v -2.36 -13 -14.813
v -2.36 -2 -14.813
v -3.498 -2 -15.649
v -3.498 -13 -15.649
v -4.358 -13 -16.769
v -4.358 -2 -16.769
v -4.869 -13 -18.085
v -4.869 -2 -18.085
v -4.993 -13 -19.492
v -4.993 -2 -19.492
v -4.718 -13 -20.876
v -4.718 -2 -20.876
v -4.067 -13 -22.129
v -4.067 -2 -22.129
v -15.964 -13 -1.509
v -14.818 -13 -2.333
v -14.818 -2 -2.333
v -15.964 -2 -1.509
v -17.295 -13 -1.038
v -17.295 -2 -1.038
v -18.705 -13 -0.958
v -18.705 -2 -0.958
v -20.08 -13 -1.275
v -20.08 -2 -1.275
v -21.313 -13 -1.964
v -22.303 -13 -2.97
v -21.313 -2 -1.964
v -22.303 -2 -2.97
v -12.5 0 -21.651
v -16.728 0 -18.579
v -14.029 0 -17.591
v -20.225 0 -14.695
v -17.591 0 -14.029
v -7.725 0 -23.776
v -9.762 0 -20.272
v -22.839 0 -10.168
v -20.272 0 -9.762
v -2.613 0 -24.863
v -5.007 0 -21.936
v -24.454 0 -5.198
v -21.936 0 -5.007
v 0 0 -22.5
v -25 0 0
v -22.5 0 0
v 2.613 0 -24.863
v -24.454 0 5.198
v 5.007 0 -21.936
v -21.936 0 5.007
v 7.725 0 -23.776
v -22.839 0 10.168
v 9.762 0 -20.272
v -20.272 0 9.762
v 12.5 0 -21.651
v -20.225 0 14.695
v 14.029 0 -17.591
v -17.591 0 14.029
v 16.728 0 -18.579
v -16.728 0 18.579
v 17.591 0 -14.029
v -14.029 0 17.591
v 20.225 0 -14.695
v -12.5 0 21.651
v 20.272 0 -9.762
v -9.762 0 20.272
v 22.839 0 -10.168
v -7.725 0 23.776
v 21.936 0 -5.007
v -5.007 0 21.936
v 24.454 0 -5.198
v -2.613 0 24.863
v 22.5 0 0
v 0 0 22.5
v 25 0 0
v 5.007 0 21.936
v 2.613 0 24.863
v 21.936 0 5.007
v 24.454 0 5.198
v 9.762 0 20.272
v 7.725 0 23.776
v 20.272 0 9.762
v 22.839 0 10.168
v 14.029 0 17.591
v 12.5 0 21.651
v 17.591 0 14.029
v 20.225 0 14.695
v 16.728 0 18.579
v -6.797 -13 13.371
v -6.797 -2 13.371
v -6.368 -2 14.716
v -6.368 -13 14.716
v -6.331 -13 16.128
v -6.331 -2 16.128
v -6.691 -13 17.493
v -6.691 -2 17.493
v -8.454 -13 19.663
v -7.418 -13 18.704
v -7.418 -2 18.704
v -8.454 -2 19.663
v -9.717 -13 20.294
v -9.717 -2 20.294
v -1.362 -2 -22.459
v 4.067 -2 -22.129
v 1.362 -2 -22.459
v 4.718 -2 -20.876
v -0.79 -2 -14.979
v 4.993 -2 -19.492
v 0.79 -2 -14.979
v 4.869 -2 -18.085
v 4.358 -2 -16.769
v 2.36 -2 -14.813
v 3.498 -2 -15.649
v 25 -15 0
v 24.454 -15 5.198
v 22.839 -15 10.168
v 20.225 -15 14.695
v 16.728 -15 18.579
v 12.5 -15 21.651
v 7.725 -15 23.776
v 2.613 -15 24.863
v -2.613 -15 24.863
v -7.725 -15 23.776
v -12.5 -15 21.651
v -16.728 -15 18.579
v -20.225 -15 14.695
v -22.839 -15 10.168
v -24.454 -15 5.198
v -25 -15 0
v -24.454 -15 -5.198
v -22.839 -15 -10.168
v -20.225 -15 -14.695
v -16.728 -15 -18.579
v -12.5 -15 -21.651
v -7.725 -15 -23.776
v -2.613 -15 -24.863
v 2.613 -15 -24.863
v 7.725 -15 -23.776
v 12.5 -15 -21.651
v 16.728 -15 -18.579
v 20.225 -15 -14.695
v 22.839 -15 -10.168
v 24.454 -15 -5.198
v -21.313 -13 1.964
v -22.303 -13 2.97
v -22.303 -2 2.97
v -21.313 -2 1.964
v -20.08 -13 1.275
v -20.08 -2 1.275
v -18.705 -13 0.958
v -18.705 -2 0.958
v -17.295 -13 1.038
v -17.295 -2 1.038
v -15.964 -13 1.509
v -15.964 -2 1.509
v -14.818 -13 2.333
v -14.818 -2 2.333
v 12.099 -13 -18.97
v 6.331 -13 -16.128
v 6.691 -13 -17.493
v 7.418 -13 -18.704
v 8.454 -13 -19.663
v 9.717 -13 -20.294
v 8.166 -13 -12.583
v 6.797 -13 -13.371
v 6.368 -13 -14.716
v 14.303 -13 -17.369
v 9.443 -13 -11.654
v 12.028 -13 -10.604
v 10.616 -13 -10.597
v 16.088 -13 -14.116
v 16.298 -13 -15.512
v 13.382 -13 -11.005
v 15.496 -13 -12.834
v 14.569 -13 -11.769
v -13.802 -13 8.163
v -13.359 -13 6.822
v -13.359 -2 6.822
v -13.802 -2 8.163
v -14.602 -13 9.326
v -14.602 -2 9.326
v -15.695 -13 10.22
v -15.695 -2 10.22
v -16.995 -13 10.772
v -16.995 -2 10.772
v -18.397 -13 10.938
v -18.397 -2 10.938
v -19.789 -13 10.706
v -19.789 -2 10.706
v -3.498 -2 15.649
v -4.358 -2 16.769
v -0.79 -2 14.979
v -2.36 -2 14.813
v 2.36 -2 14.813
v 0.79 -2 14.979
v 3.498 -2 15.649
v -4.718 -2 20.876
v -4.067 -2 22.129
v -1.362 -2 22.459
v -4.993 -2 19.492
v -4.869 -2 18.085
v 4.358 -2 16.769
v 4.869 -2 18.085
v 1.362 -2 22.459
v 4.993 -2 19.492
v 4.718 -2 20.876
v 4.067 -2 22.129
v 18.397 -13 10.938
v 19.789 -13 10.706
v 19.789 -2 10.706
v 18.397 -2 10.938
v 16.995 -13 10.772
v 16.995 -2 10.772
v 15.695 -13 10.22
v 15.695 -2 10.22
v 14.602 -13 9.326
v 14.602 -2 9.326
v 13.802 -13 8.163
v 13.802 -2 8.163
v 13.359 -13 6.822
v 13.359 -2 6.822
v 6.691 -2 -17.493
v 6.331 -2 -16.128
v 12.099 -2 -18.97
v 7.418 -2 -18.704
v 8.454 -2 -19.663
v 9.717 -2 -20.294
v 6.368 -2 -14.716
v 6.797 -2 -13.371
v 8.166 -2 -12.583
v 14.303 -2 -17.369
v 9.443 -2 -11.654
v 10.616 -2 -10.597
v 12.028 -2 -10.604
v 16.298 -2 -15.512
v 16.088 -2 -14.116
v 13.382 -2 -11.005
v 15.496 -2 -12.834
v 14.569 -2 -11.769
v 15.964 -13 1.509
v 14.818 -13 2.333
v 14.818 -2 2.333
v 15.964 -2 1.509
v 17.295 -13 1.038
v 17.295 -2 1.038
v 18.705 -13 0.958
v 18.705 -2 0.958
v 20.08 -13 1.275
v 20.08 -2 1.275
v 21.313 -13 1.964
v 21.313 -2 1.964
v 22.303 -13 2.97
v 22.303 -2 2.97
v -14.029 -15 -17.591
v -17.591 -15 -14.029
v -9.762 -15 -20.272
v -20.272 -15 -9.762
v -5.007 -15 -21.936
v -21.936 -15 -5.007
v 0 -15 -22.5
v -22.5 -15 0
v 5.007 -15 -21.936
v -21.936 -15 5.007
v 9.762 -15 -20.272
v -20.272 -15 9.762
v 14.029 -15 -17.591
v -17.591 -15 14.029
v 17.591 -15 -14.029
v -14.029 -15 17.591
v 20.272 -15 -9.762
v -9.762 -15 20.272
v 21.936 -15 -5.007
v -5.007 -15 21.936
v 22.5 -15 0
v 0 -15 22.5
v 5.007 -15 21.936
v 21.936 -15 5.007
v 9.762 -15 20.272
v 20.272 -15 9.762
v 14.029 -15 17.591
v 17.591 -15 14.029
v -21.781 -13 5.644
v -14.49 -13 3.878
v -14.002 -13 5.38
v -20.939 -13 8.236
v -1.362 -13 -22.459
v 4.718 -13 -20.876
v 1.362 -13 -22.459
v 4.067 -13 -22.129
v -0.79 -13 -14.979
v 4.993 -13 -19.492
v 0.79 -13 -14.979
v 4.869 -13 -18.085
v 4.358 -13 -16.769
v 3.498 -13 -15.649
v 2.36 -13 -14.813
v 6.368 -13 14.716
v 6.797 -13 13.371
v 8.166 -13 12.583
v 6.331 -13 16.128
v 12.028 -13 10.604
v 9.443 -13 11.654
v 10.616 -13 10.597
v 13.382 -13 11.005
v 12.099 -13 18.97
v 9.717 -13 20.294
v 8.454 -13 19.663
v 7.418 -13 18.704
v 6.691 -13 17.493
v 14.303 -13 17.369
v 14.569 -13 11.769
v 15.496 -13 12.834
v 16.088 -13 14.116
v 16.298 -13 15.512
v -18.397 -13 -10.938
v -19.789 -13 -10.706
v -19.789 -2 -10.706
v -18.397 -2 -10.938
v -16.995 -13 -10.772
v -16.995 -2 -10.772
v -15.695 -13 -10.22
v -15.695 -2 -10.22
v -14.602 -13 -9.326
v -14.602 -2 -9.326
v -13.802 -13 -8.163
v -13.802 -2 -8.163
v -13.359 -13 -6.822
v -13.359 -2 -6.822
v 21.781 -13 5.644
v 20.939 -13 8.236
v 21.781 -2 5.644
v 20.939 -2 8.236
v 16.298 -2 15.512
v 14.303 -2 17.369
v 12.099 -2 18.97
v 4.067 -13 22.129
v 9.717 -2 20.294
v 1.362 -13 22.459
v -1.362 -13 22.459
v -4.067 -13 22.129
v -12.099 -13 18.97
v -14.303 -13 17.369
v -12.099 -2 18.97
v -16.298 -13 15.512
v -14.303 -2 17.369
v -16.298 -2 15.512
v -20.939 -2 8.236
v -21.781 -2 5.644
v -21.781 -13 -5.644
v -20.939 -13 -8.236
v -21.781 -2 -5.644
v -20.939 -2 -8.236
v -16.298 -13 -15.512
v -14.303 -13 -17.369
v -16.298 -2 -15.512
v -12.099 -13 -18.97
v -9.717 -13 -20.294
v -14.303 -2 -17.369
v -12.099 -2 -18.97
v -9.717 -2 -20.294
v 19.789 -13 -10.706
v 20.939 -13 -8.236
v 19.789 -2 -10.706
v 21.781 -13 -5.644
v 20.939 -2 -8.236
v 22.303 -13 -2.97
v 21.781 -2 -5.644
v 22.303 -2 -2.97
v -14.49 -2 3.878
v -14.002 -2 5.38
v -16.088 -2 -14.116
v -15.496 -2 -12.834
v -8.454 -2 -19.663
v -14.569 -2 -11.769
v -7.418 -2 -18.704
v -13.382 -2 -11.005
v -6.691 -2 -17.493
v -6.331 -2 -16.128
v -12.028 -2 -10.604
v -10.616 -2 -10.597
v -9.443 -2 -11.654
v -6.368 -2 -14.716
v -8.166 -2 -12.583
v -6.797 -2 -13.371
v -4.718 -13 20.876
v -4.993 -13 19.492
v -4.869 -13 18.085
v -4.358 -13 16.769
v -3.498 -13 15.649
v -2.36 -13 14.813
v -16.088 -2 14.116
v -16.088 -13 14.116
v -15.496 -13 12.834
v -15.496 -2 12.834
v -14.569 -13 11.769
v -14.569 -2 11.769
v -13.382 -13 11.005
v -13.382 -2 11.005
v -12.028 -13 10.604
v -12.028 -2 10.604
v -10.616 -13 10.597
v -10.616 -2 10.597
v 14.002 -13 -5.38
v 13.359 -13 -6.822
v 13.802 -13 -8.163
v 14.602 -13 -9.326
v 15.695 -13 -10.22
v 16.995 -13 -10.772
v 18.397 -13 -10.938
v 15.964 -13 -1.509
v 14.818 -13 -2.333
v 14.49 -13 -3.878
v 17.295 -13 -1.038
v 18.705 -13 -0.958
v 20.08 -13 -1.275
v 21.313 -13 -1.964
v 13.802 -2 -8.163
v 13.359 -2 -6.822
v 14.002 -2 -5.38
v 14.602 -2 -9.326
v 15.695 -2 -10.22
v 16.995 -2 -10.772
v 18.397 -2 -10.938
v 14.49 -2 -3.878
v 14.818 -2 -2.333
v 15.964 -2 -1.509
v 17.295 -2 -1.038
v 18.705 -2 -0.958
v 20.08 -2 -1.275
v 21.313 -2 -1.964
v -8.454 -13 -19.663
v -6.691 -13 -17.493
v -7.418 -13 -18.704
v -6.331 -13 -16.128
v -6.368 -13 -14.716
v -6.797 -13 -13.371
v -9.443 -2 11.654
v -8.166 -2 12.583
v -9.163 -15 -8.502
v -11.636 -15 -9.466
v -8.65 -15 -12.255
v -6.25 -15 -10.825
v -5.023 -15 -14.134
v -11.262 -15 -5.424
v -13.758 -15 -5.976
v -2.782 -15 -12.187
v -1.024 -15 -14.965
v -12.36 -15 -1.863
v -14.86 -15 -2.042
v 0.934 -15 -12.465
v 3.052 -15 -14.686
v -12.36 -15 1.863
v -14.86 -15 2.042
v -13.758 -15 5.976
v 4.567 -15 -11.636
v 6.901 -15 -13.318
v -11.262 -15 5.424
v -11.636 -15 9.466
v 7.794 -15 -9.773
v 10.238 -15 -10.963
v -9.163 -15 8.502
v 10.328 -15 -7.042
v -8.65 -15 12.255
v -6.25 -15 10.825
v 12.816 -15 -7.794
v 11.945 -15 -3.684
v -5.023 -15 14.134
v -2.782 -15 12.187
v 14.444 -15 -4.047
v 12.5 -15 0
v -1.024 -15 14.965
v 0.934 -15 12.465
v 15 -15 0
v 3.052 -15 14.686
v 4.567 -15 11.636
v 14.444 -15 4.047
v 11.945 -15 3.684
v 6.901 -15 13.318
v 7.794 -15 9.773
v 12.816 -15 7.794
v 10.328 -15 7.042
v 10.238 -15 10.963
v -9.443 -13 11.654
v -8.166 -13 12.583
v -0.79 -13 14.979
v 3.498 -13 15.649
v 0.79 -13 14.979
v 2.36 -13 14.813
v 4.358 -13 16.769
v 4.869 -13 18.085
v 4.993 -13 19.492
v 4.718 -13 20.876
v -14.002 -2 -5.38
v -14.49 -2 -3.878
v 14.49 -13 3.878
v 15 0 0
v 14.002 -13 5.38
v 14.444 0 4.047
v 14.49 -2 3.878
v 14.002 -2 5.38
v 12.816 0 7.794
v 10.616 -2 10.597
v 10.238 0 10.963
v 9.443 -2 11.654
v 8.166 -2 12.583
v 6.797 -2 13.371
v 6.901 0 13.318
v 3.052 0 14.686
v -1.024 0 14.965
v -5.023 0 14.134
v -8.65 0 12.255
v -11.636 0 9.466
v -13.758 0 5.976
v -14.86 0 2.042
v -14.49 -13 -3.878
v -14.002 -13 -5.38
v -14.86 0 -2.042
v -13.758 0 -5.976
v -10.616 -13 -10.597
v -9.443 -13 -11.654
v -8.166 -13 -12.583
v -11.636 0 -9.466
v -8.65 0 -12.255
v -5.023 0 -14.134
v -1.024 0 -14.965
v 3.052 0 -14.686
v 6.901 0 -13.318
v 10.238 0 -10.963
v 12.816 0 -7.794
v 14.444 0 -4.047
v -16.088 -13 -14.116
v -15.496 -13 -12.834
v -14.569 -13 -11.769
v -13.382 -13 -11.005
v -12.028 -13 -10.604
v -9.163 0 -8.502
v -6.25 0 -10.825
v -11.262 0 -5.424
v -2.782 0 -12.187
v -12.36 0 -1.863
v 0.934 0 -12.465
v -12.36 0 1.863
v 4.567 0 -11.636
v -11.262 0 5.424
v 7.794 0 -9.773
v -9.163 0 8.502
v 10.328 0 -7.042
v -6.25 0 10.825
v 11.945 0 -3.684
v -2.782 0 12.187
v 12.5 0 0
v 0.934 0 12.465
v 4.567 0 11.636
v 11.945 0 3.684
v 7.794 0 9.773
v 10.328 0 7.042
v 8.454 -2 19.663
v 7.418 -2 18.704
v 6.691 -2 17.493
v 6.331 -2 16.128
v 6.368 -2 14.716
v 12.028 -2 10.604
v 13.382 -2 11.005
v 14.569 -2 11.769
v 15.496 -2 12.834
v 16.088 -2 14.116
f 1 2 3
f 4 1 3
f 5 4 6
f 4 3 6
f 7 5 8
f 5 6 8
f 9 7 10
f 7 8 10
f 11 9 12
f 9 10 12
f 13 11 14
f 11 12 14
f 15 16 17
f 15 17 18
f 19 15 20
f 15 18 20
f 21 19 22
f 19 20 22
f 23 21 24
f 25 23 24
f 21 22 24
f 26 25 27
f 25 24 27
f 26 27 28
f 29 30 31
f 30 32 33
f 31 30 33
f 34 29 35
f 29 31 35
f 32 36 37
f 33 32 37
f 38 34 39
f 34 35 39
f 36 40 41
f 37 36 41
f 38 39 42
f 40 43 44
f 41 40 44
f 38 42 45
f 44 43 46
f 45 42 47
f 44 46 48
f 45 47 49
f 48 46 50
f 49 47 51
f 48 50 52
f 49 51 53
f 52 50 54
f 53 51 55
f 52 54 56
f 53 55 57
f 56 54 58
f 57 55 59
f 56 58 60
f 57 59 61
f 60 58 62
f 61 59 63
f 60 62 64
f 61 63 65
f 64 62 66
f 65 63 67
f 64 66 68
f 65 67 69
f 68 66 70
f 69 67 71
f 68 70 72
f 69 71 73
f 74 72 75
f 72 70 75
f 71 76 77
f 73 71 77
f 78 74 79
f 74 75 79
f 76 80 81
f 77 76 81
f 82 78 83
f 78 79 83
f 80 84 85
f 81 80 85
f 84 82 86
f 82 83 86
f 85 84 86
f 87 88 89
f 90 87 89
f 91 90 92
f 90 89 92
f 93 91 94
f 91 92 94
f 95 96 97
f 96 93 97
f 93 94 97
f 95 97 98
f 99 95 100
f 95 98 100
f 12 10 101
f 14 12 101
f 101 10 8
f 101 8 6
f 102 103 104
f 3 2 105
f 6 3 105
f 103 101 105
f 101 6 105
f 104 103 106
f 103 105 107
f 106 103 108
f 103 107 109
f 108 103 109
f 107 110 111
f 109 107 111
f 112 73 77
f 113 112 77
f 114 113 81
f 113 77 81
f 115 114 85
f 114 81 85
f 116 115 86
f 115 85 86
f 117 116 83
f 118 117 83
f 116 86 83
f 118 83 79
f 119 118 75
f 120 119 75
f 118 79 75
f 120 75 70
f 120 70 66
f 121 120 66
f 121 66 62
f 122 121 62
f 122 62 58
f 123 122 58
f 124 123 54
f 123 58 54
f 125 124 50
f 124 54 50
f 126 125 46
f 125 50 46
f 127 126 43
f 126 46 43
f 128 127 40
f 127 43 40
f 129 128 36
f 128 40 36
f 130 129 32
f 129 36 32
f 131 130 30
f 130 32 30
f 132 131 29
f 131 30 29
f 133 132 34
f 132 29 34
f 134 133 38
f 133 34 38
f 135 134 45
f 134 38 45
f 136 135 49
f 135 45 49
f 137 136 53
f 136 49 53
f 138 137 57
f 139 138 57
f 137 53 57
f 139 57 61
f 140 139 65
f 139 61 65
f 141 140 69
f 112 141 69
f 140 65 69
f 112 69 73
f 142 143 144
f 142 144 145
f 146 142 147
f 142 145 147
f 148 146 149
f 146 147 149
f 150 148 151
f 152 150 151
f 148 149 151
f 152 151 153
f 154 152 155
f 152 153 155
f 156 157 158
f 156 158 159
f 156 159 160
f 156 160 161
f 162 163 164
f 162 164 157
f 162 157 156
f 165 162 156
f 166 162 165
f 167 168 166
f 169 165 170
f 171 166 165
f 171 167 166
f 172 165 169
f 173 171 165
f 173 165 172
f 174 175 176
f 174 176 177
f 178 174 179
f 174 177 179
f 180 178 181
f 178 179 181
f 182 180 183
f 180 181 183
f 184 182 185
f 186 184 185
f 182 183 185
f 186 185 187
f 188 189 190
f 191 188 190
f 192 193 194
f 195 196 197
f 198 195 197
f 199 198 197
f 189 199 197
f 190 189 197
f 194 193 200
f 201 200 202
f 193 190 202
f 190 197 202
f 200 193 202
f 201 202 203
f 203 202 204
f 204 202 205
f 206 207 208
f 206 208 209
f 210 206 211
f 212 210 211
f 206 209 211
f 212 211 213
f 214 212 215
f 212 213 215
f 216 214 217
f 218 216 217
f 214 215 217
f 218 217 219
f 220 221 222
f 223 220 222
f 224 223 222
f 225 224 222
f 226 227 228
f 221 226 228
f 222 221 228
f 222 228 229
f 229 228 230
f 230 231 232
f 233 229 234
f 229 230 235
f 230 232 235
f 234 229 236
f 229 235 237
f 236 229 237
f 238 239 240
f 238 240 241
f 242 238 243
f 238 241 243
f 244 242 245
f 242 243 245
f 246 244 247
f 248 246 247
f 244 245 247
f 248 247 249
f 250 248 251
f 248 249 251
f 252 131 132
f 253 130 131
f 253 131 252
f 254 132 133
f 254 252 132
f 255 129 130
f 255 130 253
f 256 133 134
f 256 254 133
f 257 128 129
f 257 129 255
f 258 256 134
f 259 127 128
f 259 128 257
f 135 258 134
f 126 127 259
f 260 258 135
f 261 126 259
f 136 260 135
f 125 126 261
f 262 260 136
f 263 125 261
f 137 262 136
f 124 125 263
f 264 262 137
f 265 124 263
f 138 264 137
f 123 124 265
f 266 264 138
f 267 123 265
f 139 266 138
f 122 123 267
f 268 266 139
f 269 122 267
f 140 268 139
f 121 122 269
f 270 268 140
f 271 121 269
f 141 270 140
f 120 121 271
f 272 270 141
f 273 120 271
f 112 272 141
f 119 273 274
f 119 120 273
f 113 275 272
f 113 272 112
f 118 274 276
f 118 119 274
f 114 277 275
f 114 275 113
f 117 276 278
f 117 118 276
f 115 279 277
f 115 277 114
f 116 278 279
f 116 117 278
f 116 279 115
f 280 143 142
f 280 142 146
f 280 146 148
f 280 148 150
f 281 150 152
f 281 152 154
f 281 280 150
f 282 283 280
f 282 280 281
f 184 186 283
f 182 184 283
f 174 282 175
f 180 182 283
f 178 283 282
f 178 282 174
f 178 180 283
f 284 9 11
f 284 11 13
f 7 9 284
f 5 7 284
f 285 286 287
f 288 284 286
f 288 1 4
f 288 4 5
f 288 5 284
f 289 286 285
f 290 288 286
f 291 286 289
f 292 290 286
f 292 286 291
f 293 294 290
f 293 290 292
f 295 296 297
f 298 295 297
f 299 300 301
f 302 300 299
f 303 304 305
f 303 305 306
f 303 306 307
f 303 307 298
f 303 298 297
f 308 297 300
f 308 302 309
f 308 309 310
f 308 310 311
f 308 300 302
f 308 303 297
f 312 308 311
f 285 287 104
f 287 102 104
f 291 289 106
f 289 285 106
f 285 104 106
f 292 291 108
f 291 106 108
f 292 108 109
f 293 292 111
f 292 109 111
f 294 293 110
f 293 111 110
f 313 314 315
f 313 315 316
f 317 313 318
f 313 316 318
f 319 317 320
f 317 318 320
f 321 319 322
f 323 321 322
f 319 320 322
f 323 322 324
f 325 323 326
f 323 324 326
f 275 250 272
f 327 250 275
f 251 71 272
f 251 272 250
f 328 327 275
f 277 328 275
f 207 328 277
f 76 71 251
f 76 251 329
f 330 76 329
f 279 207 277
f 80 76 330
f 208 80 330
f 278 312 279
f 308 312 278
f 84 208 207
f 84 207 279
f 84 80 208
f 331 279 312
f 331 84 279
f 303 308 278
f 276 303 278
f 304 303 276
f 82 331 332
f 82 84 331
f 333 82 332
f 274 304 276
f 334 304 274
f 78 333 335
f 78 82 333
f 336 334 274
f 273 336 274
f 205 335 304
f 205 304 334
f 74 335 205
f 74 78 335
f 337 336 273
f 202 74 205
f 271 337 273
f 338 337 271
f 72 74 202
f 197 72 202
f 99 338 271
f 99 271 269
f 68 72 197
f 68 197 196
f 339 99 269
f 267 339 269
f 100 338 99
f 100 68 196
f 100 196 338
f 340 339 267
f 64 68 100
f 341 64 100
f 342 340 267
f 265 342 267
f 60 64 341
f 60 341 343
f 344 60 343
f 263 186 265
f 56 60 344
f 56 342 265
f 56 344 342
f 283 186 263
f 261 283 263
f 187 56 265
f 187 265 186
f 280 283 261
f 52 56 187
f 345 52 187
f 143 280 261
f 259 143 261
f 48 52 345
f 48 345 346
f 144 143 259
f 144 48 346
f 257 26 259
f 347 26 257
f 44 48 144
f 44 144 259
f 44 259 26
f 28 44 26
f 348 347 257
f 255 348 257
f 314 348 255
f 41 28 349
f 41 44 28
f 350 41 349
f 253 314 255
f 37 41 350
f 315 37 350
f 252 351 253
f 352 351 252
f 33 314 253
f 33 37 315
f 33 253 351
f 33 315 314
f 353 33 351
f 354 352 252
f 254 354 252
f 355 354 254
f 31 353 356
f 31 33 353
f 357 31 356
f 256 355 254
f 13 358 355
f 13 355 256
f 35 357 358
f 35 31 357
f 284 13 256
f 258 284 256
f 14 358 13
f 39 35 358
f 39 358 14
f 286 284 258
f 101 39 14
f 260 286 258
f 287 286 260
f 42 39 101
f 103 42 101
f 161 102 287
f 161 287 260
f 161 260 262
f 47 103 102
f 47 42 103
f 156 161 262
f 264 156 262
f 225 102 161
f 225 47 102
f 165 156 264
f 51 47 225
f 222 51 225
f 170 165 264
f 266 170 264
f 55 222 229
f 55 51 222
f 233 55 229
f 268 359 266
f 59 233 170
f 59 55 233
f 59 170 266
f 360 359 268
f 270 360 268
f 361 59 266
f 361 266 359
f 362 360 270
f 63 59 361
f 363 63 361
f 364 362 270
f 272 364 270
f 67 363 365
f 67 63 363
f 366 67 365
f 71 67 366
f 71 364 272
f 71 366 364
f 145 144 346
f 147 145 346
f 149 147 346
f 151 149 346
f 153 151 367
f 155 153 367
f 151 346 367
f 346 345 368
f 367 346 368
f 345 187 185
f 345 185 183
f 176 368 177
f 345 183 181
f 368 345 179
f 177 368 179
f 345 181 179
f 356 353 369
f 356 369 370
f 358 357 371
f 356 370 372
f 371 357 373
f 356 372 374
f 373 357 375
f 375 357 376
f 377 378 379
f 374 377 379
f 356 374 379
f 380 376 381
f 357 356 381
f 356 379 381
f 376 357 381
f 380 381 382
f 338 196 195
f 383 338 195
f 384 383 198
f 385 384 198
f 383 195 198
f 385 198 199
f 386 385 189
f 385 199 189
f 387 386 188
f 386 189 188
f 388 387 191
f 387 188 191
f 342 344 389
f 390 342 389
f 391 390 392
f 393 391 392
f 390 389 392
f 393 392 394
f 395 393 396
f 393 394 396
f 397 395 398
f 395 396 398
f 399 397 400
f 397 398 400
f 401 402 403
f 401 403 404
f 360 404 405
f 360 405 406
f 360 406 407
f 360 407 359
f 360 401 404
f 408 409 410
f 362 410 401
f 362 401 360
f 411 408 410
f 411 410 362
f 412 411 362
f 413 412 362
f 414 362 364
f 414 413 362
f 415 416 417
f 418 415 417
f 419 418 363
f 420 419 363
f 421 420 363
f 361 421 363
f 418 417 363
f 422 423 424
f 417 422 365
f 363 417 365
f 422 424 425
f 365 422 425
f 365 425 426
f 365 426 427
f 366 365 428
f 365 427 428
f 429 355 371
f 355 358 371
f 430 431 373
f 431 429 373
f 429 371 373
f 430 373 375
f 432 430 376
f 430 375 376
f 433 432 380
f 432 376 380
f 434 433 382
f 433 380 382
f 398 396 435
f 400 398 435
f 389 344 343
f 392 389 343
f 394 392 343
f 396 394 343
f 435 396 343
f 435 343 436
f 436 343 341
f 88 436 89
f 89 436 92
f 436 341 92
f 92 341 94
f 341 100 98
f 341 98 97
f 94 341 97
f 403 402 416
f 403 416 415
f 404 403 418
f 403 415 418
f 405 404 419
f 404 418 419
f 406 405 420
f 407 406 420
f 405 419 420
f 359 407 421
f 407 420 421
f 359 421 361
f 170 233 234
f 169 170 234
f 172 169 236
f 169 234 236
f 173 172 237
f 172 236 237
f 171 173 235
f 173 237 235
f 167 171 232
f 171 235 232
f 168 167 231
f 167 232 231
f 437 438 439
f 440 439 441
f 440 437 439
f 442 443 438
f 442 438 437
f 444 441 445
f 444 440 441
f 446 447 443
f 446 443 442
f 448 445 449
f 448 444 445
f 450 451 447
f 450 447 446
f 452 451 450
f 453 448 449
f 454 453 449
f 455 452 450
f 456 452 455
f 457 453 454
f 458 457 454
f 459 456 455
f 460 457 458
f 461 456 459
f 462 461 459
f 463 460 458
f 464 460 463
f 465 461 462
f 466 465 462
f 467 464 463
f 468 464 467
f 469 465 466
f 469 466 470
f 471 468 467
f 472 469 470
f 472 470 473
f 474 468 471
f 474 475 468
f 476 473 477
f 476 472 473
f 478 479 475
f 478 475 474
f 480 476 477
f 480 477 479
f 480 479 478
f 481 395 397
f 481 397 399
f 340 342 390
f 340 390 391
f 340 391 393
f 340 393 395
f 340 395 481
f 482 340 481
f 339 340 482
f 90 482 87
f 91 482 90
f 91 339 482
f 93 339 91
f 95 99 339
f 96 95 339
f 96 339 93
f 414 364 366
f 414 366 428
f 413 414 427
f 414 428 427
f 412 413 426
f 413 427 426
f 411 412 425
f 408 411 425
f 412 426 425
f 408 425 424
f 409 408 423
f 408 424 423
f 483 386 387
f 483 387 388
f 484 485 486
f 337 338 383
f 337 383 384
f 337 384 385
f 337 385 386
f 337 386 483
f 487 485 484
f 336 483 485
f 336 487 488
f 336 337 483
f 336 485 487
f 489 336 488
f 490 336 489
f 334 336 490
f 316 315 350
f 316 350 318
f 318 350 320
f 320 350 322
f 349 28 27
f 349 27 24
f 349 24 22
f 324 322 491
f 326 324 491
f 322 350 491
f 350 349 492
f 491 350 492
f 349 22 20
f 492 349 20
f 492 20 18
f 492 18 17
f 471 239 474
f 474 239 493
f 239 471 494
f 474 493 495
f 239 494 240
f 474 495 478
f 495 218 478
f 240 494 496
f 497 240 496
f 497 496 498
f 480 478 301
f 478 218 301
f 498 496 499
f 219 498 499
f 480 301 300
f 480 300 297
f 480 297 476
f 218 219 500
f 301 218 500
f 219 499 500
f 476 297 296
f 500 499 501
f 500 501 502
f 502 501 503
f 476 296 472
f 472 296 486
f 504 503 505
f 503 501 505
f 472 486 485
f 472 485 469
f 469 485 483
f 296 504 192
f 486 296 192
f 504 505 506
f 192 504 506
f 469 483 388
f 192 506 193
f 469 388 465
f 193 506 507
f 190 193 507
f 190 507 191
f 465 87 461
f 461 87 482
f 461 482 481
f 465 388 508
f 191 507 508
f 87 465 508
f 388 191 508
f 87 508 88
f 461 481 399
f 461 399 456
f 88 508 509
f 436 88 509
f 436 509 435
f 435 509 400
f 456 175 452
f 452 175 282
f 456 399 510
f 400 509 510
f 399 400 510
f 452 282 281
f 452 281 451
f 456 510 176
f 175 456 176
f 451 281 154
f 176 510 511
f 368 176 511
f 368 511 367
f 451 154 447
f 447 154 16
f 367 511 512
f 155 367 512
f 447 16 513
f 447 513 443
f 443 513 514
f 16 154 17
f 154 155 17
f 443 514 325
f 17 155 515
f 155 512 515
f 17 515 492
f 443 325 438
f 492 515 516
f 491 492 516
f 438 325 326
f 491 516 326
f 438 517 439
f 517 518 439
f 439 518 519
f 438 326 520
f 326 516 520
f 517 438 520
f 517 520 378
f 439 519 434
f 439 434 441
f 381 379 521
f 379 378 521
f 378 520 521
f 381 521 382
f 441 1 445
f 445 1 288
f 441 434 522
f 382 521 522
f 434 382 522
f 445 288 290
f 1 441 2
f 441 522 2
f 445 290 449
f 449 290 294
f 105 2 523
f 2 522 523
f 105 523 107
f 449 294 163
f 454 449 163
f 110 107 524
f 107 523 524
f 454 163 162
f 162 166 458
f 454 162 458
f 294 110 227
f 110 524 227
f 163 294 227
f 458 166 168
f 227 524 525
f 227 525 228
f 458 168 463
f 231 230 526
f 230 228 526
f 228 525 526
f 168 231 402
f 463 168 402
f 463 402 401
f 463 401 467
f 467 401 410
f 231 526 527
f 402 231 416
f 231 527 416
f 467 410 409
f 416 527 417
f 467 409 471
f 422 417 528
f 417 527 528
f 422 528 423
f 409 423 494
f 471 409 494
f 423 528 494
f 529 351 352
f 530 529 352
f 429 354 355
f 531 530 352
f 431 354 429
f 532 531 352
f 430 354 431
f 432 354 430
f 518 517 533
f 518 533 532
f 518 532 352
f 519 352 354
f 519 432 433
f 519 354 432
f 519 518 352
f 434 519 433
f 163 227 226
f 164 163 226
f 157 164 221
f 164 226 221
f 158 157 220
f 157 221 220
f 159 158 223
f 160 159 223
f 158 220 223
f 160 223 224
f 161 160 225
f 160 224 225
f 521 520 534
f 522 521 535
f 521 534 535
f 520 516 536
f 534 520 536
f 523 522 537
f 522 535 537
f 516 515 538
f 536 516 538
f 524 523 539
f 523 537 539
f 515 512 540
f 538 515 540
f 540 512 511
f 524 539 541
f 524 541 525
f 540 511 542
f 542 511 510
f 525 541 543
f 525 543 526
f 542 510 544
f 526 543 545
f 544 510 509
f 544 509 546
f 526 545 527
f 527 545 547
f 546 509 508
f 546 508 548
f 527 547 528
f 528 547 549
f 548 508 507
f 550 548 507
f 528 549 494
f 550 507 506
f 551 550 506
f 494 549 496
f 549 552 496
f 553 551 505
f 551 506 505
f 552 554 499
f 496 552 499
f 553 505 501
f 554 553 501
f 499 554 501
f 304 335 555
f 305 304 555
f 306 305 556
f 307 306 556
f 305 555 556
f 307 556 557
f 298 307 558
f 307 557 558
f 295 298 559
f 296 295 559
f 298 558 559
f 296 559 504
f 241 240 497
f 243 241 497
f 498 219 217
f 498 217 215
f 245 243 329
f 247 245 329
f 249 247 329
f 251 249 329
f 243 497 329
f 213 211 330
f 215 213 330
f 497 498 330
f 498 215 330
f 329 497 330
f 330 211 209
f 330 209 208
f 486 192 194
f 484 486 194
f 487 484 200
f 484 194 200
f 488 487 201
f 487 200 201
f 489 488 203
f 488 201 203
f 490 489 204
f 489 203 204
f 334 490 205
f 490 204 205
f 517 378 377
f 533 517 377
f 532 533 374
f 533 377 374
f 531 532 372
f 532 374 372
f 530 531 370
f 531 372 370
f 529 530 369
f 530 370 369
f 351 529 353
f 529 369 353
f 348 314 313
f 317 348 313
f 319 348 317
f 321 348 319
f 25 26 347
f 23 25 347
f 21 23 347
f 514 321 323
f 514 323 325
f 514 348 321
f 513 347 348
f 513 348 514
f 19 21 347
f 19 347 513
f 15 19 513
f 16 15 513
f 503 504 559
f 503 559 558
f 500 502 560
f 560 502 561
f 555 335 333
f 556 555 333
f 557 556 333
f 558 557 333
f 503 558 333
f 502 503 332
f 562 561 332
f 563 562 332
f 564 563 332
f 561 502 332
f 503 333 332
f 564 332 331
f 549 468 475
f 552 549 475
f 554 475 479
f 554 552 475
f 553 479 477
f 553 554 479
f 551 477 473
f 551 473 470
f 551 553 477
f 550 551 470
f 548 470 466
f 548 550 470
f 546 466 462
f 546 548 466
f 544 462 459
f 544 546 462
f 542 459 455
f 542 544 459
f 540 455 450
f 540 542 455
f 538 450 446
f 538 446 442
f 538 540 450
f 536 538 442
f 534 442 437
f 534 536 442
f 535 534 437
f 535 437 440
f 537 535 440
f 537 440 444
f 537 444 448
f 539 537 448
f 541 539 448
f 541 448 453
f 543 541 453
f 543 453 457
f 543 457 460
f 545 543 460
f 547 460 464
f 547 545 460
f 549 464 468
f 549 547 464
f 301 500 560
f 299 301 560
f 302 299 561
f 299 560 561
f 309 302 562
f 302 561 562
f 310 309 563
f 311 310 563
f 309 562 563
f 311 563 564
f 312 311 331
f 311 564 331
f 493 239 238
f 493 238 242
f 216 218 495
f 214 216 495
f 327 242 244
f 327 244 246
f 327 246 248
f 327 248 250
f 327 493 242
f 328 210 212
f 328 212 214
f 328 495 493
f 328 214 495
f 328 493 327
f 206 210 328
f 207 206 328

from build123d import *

# Parameters (mm, degrees)
F1_R     = 25
F1_R_2   = 22.5
F1_R_3   = 15
F1_R_4   = 12.5
F2_DEPTH = 15
F3_R     = 5
F4_DEPTH = 11


with BuildPart() as f2:
    # F1 (on Front) → F2 (new body)
    with BuildSketch(Plane.XZ):
        Circle(F1_R)
        Circle(F1_R_2, mode=Mode.SUBTRACT)
        Circle(F1_R_3)
        Circle(F1_R_4, mode=Mode.SUBTRACT)
    extrude(amount=F2_DEPTH)

    # F3 (on offset) → F4 (join)
    with BuildSketch(Plane.XZ.offset(2)):
        with Locations((0, 19.220972)):
            Circle(F3_R)
        with Locations((-11.297804, 15.550093)):
            Circle(F3_R)
        with Locations((-18.280231, 5.939607)):
            Circle(F3_R)
        with Locations((-18.280231, -5.939607)):
            Circle(F3_R)
        with Locations((-11.297804, -15.550093)):
            Circle(F3_R)
        with Locations((0, -19.220972)):
            Circle(F3_R)
        with Locations((11.297804, -15.550093)):
            Circle(F3_R)
        with Locations((18.280231, -5.939607)):
            Circle(F3_R)
        with Locations((18.280231, 5.939607)):
            Circle(F3_R)
        with Locations((11.297804, 15.550093)):
            Circle(F3_R)
    extrude(amount=F4_DEPTH)


solid = f2.part
